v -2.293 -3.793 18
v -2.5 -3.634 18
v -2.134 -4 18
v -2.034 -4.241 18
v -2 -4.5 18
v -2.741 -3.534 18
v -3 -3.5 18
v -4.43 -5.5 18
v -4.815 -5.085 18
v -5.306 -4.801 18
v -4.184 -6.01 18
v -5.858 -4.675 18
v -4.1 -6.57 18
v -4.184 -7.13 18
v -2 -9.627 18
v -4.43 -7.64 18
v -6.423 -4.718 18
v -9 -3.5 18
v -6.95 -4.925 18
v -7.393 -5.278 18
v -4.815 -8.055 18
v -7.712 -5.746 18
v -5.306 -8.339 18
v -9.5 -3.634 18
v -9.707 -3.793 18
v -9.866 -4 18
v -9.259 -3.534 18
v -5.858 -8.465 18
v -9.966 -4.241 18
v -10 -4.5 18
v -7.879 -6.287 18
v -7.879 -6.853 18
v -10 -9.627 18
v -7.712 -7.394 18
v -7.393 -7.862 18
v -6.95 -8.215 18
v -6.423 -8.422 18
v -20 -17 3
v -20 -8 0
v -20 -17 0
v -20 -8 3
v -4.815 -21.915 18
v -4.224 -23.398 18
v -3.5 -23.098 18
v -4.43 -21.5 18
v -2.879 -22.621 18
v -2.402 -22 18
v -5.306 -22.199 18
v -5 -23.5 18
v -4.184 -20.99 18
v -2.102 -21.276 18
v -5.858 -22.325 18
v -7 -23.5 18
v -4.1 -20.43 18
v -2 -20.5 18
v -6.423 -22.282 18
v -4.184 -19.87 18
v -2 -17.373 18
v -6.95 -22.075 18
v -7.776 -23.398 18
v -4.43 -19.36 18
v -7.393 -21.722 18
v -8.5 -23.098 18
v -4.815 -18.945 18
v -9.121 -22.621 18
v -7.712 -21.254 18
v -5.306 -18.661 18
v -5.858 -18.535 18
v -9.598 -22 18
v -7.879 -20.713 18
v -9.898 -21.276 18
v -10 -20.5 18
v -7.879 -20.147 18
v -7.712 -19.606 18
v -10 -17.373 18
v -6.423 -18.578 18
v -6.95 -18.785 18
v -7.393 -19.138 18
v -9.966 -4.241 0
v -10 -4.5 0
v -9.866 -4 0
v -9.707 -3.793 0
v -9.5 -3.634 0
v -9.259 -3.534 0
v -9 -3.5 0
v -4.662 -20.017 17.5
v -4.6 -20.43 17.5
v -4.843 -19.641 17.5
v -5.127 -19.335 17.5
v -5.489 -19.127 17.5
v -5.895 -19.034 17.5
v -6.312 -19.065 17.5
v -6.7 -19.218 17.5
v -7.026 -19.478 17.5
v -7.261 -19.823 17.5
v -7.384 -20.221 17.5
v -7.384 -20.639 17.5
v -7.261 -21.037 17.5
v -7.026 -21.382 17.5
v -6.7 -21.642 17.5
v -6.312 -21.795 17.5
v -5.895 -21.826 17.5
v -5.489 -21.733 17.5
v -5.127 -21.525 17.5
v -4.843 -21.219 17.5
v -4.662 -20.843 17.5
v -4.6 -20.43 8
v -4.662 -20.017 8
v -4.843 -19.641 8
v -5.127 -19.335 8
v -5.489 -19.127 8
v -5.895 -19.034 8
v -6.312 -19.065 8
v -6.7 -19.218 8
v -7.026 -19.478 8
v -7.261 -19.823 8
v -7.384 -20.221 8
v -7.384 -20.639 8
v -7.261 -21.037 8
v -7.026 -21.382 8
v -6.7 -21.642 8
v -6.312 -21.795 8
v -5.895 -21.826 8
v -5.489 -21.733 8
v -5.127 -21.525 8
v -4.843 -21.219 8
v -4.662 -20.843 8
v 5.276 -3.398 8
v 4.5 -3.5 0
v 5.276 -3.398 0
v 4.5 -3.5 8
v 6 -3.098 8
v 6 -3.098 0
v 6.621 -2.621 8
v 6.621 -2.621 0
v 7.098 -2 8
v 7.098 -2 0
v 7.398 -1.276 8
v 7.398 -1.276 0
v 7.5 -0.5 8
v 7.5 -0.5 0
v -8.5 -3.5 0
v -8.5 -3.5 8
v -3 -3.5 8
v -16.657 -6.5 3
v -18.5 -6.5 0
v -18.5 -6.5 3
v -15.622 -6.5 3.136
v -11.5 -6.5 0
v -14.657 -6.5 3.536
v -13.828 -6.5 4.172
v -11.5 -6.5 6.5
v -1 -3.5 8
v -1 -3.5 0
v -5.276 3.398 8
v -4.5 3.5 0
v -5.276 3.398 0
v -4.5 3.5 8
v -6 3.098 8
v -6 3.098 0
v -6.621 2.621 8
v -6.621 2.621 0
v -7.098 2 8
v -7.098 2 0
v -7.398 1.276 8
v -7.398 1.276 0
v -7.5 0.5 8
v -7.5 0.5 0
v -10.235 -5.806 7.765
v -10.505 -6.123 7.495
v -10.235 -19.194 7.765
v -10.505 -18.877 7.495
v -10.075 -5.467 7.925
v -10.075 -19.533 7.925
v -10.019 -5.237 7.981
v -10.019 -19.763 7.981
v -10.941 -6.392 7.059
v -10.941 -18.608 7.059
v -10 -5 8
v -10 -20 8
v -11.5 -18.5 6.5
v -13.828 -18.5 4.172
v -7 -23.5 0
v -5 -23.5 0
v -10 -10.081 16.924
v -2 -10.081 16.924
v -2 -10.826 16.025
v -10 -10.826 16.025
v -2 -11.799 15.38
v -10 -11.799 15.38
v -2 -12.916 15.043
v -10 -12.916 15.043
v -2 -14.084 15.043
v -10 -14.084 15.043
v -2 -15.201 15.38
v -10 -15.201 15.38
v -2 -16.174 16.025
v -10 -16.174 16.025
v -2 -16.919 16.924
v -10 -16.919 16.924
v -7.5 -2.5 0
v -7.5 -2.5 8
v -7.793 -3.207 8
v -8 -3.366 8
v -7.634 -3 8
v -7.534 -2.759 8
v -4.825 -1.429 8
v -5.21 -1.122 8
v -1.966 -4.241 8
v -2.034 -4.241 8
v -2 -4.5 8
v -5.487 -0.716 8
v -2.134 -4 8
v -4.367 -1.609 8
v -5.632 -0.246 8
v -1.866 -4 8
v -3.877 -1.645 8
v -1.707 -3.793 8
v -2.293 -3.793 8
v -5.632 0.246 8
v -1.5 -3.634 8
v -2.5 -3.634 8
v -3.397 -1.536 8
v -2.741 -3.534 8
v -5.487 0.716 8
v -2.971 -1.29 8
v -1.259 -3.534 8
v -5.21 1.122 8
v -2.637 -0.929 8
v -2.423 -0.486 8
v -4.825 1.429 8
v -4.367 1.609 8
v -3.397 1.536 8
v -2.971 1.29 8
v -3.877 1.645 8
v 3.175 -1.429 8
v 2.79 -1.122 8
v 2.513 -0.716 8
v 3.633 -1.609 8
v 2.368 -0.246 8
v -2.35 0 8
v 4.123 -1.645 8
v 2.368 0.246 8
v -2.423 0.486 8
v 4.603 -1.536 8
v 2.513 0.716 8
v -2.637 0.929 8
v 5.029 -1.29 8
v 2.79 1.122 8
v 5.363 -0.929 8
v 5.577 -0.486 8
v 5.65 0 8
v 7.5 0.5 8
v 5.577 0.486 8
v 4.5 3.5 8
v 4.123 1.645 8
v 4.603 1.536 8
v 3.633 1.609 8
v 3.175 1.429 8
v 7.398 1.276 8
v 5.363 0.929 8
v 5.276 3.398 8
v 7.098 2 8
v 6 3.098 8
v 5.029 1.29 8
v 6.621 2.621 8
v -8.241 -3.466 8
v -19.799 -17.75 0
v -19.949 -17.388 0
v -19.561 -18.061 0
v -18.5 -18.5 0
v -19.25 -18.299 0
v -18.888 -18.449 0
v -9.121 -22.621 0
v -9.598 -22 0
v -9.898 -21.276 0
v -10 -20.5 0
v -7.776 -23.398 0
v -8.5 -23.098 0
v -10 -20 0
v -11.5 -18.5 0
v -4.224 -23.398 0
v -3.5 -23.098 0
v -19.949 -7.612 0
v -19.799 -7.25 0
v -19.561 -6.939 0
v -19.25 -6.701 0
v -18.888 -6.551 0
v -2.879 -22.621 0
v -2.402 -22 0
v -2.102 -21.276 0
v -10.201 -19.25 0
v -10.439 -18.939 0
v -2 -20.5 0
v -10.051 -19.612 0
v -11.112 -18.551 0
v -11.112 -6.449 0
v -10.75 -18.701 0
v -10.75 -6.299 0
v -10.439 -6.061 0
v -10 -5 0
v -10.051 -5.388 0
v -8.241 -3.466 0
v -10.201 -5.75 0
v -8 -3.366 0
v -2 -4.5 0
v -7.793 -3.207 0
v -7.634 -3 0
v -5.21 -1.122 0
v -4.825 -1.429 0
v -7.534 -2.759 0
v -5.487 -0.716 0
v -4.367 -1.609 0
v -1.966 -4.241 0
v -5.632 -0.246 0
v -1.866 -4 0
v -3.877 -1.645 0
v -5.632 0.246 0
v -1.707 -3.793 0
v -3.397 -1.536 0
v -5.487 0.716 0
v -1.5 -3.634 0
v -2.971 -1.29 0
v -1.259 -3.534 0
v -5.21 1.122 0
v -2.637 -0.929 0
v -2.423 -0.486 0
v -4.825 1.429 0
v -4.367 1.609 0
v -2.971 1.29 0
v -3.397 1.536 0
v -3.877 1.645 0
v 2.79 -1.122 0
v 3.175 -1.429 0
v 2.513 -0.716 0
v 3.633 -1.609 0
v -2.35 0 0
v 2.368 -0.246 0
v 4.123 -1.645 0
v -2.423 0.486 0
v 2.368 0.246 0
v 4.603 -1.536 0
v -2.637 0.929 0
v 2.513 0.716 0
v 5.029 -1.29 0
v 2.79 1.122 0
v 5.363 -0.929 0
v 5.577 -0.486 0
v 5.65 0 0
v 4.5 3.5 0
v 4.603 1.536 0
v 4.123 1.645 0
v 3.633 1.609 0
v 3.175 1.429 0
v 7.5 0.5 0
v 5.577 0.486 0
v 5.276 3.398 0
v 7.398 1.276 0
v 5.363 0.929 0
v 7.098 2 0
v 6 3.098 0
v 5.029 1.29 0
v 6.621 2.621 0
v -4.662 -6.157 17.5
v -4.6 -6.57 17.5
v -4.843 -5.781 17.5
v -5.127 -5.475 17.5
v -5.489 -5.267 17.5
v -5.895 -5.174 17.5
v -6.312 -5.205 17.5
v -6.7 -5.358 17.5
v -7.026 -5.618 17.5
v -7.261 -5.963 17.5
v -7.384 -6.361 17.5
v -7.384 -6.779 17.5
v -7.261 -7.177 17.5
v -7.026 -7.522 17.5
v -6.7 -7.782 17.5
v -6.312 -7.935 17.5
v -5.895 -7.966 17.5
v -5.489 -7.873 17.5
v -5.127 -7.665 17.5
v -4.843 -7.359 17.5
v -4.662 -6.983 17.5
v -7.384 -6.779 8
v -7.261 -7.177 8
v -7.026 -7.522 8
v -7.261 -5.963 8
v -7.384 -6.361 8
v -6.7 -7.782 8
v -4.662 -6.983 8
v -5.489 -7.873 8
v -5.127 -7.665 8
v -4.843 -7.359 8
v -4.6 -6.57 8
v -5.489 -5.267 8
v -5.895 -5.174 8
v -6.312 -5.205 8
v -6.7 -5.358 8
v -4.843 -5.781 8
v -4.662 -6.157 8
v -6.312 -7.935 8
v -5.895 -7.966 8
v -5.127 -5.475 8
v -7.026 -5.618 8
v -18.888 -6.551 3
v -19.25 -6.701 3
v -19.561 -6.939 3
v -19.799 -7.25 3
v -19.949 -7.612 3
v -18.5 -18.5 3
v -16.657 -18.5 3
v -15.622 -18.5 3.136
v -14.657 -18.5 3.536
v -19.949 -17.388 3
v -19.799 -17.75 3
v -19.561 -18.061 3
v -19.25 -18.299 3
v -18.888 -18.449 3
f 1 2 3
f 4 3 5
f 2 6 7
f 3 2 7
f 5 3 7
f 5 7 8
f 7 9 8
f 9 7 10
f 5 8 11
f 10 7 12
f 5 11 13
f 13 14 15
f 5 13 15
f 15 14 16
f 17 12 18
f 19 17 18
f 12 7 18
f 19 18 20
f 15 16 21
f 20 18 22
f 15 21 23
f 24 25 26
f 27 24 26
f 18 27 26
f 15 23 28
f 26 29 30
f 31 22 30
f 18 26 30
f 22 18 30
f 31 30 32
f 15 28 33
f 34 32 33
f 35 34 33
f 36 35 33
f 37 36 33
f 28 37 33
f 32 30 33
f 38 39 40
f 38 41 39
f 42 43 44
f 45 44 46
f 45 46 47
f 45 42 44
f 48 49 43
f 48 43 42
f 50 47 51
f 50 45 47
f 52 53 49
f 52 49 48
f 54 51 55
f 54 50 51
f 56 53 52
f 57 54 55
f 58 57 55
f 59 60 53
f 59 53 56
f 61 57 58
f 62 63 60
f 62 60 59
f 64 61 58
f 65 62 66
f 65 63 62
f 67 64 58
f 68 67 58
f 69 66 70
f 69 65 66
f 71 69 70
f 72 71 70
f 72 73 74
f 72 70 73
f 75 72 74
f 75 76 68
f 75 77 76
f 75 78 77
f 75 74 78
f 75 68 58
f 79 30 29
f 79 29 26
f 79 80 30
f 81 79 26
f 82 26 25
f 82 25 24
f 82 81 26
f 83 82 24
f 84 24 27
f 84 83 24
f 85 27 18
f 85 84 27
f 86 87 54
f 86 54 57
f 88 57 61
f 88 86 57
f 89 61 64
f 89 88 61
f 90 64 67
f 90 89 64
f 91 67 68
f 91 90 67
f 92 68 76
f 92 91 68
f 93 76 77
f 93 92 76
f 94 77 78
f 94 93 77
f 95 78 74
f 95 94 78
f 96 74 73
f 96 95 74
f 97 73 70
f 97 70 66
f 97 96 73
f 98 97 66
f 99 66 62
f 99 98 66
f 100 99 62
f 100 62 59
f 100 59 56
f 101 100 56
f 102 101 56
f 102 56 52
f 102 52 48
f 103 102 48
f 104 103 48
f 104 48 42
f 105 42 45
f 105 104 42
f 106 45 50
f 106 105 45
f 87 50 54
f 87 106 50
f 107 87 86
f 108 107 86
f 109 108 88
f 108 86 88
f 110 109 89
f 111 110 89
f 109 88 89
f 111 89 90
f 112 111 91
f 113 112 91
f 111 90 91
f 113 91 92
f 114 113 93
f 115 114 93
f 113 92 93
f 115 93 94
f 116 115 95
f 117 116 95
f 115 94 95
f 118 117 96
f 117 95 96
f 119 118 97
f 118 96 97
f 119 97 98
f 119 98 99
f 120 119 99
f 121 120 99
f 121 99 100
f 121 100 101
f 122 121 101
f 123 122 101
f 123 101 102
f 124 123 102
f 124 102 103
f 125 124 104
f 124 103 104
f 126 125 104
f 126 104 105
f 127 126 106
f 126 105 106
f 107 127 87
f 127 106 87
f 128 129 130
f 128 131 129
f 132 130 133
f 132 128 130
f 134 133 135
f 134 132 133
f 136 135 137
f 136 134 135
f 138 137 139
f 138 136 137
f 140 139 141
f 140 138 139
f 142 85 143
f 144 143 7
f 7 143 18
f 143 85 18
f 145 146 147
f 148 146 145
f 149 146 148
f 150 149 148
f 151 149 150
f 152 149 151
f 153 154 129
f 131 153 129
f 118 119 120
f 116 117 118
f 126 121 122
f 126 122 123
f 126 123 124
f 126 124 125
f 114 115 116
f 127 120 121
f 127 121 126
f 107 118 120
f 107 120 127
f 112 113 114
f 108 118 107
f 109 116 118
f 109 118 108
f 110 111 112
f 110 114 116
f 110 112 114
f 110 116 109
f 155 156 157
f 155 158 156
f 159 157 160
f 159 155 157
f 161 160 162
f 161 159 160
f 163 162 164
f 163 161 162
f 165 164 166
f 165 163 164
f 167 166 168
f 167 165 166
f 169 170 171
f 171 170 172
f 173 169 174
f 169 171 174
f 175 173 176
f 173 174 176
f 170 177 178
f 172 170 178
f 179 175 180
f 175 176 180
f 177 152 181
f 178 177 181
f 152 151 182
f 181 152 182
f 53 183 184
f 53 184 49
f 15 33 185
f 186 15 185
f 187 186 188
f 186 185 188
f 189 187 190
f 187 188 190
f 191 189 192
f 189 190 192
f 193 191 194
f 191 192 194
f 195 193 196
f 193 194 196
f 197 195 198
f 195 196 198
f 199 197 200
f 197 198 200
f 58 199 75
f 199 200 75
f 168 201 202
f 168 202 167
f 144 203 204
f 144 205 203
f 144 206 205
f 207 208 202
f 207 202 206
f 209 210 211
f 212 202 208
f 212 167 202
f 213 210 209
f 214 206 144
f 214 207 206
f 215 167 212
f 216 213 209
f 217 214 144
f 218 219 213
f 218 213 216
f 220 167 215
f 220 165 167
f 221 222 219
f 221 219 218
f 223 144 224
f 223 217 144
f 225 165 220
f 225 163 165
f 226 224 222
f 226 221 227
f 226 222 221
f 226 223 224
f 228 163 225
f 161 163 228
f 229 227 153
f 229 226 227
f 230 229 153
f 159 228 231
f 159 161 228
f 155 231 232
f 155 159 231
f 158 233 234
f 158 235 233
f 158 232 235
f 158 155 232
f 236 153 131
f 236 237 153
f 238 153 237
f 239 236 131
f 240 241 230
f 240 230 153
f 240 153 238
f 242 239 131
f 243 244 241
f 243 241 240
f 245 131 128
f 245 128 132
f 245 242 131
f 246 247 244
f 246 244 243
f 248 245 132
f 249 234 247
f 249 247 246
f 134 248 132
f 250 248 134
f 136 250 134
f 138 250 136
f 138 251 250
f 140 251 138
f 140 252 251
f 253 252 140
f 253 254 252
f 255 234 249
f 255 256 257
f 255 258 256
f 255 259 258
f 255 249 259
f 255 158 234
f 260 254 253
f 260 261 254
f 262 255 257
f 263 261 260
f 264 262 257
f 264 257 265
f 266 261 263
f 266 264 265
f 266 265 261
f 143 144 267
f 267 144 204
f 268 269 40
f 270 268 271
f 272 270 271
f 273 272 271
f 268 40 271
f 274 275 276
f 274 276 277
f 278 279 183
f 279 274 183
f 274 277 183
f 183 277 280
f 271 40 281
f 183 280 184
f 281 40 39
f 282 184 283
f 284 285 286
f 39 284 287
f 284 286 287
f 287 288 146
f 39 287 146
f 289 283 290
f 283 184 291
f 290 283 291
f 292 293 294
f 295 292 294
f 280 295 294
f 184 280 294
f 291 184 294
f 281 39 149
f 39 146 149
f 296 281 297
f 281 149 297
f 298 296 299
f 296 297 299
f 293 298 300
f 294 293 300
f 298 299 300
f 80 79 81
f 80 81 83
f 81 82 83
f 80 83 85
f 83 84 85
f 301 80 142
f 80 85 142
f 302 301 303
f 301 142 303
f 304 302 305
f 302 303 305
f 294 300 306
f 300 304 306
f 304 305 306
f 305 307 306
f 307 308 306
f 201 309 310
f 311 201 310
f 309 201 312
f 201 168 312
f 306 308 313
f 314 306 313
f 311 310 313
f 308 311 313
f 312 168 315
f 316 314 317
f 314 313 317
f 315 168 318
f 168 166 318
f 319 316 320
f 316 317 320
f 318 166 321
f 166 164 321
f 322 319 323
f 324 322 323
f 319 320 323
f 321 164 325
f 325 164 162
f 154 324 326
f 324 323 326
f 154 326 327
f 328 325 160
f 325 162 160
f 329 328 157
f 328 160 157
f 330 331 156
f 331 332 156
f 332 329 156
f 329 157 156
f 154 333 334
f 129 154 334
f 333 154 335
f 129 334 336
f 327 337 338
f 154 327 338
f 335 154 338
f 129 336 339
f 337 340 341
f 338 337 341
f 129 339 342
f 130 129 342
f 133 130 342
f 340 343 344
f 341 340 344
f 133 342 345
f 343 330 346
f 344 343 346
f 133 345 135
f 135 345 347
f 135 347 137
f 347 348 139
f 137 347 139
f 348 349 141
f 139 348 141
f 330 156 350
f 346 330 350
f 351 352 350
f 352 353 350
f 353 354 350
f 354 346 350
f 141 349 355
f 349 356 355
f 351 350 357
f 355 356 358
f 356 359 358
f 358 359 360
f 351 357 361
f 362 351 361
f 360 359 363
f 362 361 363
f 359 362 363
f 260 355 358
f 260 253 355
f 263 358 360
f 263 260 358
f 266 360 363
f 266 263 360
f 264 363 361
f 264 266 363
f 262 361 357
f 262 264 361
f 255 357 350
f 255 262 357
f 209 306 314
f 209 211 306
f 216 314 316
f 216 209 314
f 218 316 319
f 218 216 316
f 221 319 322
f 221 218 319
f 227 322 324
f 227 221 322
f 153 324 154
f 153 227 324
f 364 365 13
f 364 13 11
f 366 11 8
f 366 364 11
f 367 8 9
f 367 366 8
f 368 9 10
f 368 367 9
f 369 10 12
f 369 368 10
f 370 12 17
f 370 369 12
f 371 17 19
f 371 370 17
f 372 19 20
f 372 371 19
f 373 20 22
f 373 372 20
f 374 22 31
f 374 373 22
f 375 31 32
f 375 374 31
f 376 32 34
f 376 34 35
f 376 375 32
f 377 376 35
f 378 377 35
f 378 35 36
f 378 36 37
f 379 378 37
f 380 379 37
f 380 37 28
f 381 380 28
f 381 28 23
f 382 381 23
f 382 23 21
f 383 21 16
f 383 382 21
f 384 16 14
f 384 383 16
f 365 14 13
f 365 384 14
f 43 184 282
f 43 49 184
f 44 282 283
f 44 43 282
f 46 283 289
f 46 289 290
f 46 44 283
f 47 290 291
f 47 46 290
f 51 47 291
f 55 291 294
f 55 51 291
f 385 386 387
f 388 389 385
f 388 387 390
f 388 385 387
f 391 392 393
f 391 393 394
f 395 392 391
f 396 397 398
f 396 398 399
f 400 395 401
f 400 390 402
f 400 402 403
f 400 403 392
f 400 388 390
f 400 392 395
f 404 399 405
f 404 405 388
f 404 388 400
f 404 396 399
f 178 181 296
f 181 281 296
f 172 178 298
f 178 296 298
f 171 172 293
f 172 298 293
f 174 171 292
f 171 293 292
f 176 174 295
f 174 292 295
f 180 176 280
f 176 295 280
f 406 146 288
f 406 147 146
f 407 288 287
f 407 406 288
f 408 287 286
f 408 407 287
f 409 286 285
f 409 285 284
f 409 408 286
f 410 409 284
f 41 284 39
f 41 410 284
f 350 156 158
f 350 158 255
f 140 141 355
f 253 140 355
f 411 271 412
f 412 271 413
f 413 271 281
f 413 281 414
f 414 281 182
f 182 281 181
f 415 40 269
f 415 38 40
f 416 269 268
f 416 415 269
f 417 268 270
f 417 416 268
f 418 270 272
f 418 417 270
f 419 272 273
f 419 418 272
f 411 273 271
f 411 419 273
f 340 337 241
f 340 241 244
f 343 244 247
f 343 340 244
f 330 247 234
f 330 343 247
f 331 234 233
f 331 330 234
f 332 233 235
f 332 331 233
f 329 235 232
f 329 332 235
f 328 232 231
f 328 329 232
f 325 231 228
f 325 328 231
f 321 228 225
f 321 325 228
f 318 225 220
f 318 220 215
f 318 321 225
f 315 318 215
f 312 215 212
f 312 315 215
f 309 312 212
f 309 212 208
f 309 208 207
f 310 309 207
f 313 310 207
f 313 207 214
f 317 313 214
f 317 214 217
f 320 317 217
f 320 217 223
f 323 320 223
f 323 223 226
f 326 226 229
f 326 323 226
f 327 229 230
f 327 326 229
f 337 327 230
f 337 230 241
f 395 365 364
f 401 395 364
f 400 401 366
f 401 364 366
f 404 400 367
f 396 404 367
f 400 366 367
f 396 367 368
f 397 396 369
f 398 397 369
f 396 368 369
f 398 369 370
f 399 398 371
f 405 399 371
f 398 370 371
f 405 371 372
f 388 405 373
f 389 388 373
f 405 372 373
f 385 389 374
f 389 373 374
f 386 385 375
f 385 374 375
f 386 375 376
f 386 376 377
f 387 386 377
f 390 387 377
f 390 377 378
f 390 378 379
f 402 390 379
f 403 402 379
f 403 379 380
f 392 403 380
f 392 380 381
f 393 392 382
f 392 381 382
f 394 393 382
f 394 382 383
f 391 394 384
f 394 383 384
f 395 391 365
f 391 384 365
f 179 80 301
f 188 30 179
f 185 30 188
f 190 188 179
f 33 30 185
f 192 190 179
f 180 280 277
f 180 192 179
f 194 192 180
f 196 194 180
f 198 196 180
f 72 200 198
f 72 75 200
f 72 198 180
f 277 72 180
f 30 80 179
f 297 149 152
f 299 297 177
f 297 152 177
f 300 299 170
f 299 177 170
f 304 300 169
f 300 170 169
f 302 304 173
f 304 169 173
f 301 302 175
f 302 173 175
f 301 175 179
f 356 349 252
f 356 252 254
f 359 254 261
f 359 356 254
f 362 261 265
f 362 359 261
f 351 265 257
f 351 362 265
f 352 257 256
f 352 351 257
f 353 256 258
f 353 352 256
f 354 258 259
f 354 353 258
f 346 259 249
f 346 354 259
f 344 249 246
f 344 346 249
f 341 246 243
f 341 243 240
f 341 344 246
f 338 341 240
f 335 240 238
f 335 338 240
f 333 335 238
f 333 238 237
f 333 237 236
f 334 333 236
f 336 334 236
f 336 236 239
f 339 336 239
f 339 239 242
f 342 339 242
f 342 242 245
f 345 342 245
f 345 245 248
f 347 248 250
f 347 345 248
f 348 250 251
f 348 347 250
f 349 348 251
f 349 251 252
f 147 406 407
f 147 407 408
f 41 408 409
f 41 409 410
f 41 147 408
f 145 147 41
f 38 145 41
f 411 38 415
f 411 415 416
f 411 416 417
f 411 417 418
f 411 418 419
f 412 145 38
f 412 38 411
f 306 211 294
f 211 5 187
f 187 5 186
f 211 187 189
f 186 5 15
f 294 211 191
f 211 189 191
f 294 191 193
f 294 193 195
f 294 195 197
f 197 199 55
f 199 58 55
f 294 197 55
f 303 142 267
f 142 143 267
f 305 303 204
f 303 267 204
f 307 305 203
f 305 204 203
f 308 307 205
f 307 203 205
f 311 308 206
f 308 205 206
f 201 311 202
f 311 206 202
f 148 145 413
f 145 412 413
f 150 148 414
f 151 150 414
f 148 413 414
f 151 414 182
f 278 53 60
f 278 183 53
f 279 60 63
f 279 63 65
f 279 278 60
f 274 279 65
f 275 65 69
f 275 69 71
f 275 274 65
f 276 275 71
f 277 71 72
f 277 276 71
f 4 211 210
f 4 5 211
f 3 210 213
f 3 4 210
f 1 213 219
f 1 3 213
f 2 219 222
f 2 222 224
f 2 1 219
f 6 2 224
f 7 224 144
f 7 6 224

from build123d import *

# Parameters (mm, degrees)
SKETCH_W        = 15
SKETCH_H        = 7
SKETCH_R        = 1.65
PAD_DEPTH       = 8
SKETCH001_W     = 8
SKETCH001_H     = 8
PAD001_DEPTH    = 20
PAD002_DEPTH    = 8
SKETCH003_R     = 1.4
POCKET_DEPTH    = 10
CHAMFER_SIZE    = 0.5
FILLET_R        = 3
FILLET001_R     = 1
FILLET002_R     = 1
FILLET003_R     = 1
SKETCH007_W     = 12
SKETCH007_H     = 3
PAD004_DEPTH    = 10
CHAMFER001_SIZE = 5
FILLET005_R     = 4
FILLET006_R     = 1.5


with BuildPart() as part:
    # Sketch (on XY_Plane of Origin) → Pad (new body)
    with BuildSketch(Plane.XY):
        Rectangle(SKETCH_W, SKETCH_H)
        with Locations((-4, 0)):
            Circle(SKETCH_R, mode=Mode.SUBTRACT)
        with Locations((4, 0)):
            Circle(SKETCH_R, mode=Mode.SUBTRACT)
    extrude(amount=PAD_DEPTH)

    # Sketch001 (on Face2 of Pad) → Pad001 (join)
    with BuildSketch(Plane.XZ.offset(3.5)):
        with Locations((-6, 4)):
            Rectangle(SKETCH001_W, SKETCH001_H)
    extrude(amount=PAD001_DEPTH)

    # Sketch002 (on Face5 of Pad001) → Pad002 (join)
    with BuildSketch(Plane(origin=(-10, 0, 0), x_dir=(0, -1, 0), z_dir=(-1, 0, 0))):
        with BuildLine():
            Line((3.5, 8), (23.5, 8))
            Line((23.5, 8), (23.5, 18))
            Line((23.5, 18), (17.372983, 18))
            ThreePointArc((9.627017, 18), (13.5, 15), (17.372983, 18))
            Line((3.5, 18), (9.627017, 18))
            Line((3.5, 8), (3.5, 18))
        make_face()
    extrude(amount=-PAD002_DEPTH)

    # Sketch003 (on Face3 of Pad002) → Pocket (cut)
    with BuildSketch(Plane.XY.offset(18)):
        with Locations((-6, -6.57)):
            Circle(SKETCH003_R)
        with Locations((-6, -20.43)):
            Circle(SKETCH003_R)
    extrude(amount=-POCKET_DEPTH, mode=Mode.SUBTRACT)

    # Chamfer
    chamfer_edges = [part.edges().sort_by_distance(p)[0] for p in [
        (-7.4, -20.43, 18),
        (-7.4, -6.57, 18),
    ]]
    chamfer(chamfer_edges, length=CHAMFER_SIZE)

    # Fillet
    fillet_edges = [part.edges().sort_by_distance(p)[0] for p in [
        (-7.5, 3.5, 4),
        (7.5, 3.5, 4),
        (7.5, -3.5, 4),
        (-2, -23.5, 9),
        (-10, -23.5, 9),
    ]]
    fillet(fillet_edges, radius=FILLET_R)

    # Fillet001
    fillet001_edges = [part.edges().sort_by_distance(p)[0] for p in [
        (-7.5, -3.5, 4),
        (-10, -3.5, 9),
    ]]
    fillet(fillet001_edges, radius=FILLET001_R)

    # Fillet002
    fillet002_edges = [part.edges().sort_by_distance(p)[0] for p in [
        (-2, -3.5, 4),
    ]]
    fillet(fillet002_edges, radius=FILLET002_R)

    # Fillet003
    fillet003_edges = [part.edges().sort_by_distance(p)[0] for p in [
        (-2, -3.5, 13),
    ]]
    fillet(fillet003_edges, radius=FILLET003_R)

    # Sketch007 (on Face11 of Fillet003) → Pad004 (join)
    with BuildSketch(Plane(origin=(-10, 0, 0), x_dir=(0, -1, 0), z_dir=(-1, 0, 0))):
        with Locations((12.5, 1.5)):
            Rectangle(SKETCH007_W, SKETCH007_H)
    extrude(amount=PAD004_DEPTH)

    # Chamfer001
    chamfer001_edges = [part.edges().sort_by_distance(p)[0] for p in [
        (-10, -12.5, 3),
    ]]
    chamfer(chamfer001_edges, length=CHAMFER001_SIZE)

    # Fillet005
    fillet005_edges = [part.edges().sort_by_distance(p)[0] for p in [
        (-15, -12.5, 3),
    ]]
    fillet(fillet005_edges, radius=FILLET005_R)

    # Fillet006
    fillet006_edges = [part.edges().sort_by_distance(p)[0] for p in [
        (-20, -6.5, 1.5),
        (-10, -6.5, 1.5),
        (-10, -18.5, 1.5),
        (-10, -18.5, 5.5),
        (-20, -18.5, 1.5),
        (-10, -6.5, 5.5),
    ]]
    fillet(fillet006_edges, radius=FILLET006_R)


solid = part.part
